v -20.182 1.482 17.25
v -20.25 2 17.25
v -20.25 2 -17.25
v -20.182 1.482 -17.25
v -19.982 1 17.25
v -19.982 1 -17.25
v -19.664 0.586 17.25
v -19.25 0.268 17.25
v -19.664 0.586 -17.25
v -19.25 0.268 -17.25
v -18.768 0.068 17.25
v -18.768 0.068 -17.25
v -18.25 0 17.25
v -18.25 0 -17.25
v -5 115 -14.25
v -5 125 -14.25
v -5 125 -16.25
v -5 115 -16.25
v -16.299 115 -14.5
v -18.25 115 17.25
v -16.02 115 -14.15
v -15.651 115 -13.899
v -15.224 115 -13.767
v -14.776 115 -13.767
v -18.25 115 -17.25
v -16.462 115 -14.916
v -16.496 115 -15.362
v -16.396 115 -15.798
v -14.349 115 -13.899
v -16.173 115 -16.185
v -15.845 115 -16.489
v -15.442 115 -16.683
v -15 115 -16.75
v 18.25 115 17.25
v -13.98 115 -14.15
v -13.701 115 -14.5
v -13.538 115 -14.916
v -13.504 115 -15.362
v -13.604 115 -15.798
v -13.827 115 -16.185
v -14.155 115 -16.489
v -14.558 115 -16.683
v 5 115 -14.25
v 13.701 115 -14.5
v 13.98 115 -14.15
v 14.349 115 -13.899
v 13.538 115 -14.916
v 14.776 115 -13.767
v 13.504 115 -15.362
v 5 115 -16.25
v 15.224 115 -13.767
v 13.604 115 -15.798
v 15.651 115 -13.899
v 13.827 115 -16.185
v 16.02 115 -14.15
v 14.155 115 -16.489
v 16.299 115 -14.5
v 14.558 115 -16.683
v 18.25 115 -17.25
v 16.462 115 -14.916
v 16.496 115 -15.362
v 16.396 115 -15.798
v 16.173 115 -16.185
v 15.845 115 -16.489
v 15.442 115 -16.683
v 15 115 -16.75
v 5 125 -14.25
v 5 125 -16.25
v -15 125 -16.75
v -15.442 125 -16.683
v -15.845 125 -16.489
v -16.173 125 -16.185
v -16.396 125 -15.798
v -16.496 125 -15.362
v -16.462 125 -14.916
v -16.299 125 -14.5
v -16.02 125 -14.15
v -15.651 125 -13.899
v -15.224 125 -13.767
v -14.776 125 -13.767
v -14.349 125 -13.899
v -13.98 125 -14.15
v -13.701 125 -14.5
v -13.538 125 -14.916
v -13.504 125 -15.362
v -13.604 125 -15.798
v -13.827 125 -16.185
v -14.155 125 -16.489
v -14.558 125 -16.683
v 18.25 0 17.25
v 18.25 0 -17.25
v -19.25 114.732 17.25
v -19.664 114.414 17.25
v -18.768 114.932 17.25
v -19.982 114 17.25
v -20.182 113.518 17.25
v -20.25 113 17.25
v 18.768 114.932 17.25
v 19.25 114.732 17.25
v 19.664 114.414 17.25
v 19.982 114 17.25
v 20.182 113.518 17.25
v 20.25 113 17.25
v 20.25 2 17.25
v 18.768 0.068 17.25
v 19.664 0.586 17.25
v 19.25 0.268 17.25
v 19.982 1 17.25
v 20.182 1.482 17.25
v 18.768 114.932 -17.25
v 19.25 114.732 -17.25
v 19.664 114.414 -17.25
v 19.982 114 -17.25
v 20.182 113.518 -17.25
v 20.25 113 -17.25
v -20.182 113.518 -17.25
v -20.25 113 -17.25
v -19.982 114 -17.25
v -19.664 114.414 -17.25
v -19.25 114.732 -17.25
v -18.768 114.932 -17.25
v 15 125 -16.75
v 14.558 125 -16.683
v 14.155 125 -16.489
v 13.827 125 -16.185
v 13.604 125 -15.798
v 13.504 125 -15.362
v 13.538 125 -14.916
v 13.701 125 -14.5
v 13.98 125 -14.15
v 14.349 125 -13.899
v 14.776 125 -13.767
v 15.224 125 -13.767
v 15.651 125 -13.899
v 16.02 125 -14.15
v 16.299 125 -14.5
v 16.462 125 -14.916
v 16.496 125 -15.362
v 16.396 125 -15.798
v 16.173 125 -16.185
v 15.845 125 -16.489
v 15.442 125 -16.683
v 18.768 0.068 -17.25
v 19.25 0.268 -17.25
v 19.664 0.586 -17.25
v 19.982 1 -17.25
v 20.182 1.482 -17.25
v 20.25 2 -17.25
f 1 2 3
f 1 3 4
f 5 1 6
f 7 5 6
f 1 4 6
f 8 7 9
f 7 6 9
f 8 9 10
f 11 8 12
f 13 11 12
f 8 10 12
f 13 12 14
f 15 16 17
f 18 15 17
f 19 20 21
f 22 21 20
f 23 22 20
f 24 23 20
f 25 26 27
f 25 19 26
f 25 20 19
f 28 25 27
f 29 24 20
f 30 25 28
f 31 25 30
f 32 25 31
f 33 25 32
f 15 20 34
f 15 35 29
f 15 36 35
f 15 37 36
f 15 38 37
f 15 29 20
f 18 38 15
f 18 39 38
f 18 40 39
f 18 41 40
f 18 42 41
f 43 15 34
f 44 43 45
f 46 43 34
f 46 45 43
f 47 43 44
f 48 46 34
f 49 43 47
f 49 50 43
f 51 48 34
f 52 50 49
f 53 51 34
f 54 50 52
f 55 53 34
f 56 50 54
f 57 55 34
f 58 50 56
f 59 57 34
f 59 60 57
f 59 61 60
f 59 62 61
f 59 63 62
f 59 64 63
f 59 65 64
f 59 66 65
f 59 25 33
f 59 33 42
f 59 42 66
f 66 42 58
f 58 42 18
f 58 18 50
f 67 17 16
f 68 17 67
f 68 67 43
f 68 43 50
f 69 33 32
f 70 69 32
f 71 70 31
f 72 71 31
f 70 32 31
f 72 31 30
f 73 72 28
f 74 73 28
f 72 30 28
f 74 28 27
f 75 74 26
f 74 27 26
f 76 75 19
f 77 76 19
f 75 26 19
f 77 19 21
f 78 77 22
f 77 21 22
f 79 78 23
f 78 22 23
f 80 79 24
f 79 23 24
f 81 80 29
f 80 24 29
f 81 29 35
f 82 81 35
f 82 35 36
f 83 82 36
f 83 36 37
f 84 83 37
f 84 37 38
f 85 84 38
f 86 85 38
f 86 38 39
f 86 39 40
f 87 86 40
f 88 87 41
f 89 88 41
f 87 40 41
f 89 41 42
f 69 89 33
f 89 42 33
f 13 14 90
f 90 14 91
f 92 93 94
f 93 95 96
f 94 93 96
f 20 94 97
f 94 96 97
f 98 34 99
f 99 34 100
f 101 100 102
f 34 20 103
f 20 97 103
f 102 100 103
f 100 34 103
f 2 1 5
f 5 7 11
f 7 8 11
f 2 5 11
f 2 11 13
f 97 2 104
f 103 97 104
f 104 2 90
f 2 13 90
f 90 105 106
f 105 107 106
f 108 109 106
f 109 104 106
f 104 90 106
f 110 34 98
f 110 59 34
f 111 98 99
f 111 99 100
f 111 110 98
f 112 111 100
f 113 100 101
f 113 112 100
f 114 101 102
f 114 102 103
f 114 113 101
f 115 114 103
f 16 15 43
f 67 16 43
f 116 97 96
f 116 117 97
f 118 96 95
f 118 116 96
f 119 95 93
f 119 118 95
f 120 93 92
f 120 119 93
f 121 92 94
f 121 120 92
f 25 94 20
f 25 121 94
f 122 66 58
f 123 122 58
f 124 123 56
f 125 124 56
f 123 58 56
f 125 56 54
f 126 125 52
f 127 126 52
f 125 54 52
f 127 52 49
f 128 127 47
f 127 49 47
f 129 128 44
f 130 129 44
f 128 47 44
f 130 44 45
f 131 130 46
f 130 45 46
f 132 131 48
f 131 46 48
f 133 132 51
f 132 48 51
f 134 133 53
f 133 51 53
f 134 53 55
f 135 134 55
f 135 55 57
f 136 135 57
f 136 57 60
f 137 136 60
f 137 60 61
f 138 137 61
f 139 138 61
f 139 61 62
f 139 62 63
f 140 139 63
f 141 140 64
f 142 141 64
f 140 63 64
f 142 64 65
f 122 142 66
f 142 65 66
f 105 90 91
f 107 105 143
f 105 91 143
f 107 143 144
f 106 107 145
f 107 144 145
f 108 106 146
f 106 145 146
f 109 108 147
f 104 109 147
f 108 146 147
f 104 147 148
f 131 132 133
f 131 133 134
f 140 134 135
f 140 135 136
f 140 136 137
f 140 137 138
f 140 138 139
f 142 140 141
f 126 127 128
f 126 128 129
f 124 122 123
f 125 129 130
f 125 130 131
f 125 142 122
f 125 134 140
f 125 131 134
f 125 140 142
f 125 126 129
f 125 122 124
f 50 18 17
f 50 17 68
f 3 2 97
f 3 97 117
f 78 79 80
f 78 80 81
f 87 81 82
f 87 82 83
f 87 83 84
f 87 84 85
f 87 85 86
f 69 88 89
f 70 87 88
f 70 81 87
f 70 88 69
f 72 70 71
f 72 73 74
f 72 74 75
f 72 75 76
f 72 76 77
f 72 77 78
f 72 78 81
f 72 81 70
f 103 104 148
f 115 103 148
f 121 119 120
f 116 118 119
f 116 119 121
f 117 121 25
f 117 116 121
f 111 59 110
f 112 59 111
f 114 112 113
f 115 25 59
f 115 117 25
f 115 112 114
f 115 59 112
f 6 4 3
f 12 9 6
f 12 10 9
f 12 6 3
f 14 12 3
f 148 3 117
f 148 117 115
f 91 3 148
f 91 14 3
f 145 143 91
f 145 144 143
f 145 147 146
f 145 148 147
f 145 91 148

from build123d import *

# Parameters (mm, degrees)
SKETCH1_W           = 40.5
SKETCH1_H           = 34.5
BOSS_EXTRUDE1_DEPTH = 115
SKETCH2_R           = 1.5
SKETCH2_W           = 10
SKETCH2_H           = 2
BOSS_EXTRUDE2_DEPTH = 10
FILLET1_R           = 2


with BuildPart() as part:
    # Sketch1 → Boss-Extrude1 (new body)
    with BuildSketch(Plane(origin=(0, 0, 0), x_dir=(1, 0, 0), z_dir=(0, 1, 0))):
        Rectangle(SKETCH1_W, SKETCH1_H)
    extrude(amount=BOSS_EXTRUDE1_DEPTH)

    # Sketch2 → Boss-Extrude2 (add)
    with BuildSketch(Plane(origin=(0, 115, 0), x_dir=(1, 0, 0), z_dir=(0, 1, 0))):
        with Locations(Location((-15, 15.25, 0), (0, 0, 90))):
            Circle(SKETCH2_R)
        with Locations(Location((15, 15.25, 0), (0, 0, 90))):
            Circle(SKETCH2_R)
        with Locations((0, 15.25)):
            Rectangle(SKETCH2_W, SKETCH2_H)
    extrude(amount=BOSS_EXTRUDE2_DEPTH)

    # Fillet1
    fillet1_edges = [part.edges().sort_by_distance(p)[0] for p in [
        (-20.25, 115, 0),
        (20.25, 115, 0),
        (-20.25, 0, 0),
        (20.25, 0, 0),
    ]]
    fillet(fillet1_edges, radius=FILLET1_R)


solid = part.part
